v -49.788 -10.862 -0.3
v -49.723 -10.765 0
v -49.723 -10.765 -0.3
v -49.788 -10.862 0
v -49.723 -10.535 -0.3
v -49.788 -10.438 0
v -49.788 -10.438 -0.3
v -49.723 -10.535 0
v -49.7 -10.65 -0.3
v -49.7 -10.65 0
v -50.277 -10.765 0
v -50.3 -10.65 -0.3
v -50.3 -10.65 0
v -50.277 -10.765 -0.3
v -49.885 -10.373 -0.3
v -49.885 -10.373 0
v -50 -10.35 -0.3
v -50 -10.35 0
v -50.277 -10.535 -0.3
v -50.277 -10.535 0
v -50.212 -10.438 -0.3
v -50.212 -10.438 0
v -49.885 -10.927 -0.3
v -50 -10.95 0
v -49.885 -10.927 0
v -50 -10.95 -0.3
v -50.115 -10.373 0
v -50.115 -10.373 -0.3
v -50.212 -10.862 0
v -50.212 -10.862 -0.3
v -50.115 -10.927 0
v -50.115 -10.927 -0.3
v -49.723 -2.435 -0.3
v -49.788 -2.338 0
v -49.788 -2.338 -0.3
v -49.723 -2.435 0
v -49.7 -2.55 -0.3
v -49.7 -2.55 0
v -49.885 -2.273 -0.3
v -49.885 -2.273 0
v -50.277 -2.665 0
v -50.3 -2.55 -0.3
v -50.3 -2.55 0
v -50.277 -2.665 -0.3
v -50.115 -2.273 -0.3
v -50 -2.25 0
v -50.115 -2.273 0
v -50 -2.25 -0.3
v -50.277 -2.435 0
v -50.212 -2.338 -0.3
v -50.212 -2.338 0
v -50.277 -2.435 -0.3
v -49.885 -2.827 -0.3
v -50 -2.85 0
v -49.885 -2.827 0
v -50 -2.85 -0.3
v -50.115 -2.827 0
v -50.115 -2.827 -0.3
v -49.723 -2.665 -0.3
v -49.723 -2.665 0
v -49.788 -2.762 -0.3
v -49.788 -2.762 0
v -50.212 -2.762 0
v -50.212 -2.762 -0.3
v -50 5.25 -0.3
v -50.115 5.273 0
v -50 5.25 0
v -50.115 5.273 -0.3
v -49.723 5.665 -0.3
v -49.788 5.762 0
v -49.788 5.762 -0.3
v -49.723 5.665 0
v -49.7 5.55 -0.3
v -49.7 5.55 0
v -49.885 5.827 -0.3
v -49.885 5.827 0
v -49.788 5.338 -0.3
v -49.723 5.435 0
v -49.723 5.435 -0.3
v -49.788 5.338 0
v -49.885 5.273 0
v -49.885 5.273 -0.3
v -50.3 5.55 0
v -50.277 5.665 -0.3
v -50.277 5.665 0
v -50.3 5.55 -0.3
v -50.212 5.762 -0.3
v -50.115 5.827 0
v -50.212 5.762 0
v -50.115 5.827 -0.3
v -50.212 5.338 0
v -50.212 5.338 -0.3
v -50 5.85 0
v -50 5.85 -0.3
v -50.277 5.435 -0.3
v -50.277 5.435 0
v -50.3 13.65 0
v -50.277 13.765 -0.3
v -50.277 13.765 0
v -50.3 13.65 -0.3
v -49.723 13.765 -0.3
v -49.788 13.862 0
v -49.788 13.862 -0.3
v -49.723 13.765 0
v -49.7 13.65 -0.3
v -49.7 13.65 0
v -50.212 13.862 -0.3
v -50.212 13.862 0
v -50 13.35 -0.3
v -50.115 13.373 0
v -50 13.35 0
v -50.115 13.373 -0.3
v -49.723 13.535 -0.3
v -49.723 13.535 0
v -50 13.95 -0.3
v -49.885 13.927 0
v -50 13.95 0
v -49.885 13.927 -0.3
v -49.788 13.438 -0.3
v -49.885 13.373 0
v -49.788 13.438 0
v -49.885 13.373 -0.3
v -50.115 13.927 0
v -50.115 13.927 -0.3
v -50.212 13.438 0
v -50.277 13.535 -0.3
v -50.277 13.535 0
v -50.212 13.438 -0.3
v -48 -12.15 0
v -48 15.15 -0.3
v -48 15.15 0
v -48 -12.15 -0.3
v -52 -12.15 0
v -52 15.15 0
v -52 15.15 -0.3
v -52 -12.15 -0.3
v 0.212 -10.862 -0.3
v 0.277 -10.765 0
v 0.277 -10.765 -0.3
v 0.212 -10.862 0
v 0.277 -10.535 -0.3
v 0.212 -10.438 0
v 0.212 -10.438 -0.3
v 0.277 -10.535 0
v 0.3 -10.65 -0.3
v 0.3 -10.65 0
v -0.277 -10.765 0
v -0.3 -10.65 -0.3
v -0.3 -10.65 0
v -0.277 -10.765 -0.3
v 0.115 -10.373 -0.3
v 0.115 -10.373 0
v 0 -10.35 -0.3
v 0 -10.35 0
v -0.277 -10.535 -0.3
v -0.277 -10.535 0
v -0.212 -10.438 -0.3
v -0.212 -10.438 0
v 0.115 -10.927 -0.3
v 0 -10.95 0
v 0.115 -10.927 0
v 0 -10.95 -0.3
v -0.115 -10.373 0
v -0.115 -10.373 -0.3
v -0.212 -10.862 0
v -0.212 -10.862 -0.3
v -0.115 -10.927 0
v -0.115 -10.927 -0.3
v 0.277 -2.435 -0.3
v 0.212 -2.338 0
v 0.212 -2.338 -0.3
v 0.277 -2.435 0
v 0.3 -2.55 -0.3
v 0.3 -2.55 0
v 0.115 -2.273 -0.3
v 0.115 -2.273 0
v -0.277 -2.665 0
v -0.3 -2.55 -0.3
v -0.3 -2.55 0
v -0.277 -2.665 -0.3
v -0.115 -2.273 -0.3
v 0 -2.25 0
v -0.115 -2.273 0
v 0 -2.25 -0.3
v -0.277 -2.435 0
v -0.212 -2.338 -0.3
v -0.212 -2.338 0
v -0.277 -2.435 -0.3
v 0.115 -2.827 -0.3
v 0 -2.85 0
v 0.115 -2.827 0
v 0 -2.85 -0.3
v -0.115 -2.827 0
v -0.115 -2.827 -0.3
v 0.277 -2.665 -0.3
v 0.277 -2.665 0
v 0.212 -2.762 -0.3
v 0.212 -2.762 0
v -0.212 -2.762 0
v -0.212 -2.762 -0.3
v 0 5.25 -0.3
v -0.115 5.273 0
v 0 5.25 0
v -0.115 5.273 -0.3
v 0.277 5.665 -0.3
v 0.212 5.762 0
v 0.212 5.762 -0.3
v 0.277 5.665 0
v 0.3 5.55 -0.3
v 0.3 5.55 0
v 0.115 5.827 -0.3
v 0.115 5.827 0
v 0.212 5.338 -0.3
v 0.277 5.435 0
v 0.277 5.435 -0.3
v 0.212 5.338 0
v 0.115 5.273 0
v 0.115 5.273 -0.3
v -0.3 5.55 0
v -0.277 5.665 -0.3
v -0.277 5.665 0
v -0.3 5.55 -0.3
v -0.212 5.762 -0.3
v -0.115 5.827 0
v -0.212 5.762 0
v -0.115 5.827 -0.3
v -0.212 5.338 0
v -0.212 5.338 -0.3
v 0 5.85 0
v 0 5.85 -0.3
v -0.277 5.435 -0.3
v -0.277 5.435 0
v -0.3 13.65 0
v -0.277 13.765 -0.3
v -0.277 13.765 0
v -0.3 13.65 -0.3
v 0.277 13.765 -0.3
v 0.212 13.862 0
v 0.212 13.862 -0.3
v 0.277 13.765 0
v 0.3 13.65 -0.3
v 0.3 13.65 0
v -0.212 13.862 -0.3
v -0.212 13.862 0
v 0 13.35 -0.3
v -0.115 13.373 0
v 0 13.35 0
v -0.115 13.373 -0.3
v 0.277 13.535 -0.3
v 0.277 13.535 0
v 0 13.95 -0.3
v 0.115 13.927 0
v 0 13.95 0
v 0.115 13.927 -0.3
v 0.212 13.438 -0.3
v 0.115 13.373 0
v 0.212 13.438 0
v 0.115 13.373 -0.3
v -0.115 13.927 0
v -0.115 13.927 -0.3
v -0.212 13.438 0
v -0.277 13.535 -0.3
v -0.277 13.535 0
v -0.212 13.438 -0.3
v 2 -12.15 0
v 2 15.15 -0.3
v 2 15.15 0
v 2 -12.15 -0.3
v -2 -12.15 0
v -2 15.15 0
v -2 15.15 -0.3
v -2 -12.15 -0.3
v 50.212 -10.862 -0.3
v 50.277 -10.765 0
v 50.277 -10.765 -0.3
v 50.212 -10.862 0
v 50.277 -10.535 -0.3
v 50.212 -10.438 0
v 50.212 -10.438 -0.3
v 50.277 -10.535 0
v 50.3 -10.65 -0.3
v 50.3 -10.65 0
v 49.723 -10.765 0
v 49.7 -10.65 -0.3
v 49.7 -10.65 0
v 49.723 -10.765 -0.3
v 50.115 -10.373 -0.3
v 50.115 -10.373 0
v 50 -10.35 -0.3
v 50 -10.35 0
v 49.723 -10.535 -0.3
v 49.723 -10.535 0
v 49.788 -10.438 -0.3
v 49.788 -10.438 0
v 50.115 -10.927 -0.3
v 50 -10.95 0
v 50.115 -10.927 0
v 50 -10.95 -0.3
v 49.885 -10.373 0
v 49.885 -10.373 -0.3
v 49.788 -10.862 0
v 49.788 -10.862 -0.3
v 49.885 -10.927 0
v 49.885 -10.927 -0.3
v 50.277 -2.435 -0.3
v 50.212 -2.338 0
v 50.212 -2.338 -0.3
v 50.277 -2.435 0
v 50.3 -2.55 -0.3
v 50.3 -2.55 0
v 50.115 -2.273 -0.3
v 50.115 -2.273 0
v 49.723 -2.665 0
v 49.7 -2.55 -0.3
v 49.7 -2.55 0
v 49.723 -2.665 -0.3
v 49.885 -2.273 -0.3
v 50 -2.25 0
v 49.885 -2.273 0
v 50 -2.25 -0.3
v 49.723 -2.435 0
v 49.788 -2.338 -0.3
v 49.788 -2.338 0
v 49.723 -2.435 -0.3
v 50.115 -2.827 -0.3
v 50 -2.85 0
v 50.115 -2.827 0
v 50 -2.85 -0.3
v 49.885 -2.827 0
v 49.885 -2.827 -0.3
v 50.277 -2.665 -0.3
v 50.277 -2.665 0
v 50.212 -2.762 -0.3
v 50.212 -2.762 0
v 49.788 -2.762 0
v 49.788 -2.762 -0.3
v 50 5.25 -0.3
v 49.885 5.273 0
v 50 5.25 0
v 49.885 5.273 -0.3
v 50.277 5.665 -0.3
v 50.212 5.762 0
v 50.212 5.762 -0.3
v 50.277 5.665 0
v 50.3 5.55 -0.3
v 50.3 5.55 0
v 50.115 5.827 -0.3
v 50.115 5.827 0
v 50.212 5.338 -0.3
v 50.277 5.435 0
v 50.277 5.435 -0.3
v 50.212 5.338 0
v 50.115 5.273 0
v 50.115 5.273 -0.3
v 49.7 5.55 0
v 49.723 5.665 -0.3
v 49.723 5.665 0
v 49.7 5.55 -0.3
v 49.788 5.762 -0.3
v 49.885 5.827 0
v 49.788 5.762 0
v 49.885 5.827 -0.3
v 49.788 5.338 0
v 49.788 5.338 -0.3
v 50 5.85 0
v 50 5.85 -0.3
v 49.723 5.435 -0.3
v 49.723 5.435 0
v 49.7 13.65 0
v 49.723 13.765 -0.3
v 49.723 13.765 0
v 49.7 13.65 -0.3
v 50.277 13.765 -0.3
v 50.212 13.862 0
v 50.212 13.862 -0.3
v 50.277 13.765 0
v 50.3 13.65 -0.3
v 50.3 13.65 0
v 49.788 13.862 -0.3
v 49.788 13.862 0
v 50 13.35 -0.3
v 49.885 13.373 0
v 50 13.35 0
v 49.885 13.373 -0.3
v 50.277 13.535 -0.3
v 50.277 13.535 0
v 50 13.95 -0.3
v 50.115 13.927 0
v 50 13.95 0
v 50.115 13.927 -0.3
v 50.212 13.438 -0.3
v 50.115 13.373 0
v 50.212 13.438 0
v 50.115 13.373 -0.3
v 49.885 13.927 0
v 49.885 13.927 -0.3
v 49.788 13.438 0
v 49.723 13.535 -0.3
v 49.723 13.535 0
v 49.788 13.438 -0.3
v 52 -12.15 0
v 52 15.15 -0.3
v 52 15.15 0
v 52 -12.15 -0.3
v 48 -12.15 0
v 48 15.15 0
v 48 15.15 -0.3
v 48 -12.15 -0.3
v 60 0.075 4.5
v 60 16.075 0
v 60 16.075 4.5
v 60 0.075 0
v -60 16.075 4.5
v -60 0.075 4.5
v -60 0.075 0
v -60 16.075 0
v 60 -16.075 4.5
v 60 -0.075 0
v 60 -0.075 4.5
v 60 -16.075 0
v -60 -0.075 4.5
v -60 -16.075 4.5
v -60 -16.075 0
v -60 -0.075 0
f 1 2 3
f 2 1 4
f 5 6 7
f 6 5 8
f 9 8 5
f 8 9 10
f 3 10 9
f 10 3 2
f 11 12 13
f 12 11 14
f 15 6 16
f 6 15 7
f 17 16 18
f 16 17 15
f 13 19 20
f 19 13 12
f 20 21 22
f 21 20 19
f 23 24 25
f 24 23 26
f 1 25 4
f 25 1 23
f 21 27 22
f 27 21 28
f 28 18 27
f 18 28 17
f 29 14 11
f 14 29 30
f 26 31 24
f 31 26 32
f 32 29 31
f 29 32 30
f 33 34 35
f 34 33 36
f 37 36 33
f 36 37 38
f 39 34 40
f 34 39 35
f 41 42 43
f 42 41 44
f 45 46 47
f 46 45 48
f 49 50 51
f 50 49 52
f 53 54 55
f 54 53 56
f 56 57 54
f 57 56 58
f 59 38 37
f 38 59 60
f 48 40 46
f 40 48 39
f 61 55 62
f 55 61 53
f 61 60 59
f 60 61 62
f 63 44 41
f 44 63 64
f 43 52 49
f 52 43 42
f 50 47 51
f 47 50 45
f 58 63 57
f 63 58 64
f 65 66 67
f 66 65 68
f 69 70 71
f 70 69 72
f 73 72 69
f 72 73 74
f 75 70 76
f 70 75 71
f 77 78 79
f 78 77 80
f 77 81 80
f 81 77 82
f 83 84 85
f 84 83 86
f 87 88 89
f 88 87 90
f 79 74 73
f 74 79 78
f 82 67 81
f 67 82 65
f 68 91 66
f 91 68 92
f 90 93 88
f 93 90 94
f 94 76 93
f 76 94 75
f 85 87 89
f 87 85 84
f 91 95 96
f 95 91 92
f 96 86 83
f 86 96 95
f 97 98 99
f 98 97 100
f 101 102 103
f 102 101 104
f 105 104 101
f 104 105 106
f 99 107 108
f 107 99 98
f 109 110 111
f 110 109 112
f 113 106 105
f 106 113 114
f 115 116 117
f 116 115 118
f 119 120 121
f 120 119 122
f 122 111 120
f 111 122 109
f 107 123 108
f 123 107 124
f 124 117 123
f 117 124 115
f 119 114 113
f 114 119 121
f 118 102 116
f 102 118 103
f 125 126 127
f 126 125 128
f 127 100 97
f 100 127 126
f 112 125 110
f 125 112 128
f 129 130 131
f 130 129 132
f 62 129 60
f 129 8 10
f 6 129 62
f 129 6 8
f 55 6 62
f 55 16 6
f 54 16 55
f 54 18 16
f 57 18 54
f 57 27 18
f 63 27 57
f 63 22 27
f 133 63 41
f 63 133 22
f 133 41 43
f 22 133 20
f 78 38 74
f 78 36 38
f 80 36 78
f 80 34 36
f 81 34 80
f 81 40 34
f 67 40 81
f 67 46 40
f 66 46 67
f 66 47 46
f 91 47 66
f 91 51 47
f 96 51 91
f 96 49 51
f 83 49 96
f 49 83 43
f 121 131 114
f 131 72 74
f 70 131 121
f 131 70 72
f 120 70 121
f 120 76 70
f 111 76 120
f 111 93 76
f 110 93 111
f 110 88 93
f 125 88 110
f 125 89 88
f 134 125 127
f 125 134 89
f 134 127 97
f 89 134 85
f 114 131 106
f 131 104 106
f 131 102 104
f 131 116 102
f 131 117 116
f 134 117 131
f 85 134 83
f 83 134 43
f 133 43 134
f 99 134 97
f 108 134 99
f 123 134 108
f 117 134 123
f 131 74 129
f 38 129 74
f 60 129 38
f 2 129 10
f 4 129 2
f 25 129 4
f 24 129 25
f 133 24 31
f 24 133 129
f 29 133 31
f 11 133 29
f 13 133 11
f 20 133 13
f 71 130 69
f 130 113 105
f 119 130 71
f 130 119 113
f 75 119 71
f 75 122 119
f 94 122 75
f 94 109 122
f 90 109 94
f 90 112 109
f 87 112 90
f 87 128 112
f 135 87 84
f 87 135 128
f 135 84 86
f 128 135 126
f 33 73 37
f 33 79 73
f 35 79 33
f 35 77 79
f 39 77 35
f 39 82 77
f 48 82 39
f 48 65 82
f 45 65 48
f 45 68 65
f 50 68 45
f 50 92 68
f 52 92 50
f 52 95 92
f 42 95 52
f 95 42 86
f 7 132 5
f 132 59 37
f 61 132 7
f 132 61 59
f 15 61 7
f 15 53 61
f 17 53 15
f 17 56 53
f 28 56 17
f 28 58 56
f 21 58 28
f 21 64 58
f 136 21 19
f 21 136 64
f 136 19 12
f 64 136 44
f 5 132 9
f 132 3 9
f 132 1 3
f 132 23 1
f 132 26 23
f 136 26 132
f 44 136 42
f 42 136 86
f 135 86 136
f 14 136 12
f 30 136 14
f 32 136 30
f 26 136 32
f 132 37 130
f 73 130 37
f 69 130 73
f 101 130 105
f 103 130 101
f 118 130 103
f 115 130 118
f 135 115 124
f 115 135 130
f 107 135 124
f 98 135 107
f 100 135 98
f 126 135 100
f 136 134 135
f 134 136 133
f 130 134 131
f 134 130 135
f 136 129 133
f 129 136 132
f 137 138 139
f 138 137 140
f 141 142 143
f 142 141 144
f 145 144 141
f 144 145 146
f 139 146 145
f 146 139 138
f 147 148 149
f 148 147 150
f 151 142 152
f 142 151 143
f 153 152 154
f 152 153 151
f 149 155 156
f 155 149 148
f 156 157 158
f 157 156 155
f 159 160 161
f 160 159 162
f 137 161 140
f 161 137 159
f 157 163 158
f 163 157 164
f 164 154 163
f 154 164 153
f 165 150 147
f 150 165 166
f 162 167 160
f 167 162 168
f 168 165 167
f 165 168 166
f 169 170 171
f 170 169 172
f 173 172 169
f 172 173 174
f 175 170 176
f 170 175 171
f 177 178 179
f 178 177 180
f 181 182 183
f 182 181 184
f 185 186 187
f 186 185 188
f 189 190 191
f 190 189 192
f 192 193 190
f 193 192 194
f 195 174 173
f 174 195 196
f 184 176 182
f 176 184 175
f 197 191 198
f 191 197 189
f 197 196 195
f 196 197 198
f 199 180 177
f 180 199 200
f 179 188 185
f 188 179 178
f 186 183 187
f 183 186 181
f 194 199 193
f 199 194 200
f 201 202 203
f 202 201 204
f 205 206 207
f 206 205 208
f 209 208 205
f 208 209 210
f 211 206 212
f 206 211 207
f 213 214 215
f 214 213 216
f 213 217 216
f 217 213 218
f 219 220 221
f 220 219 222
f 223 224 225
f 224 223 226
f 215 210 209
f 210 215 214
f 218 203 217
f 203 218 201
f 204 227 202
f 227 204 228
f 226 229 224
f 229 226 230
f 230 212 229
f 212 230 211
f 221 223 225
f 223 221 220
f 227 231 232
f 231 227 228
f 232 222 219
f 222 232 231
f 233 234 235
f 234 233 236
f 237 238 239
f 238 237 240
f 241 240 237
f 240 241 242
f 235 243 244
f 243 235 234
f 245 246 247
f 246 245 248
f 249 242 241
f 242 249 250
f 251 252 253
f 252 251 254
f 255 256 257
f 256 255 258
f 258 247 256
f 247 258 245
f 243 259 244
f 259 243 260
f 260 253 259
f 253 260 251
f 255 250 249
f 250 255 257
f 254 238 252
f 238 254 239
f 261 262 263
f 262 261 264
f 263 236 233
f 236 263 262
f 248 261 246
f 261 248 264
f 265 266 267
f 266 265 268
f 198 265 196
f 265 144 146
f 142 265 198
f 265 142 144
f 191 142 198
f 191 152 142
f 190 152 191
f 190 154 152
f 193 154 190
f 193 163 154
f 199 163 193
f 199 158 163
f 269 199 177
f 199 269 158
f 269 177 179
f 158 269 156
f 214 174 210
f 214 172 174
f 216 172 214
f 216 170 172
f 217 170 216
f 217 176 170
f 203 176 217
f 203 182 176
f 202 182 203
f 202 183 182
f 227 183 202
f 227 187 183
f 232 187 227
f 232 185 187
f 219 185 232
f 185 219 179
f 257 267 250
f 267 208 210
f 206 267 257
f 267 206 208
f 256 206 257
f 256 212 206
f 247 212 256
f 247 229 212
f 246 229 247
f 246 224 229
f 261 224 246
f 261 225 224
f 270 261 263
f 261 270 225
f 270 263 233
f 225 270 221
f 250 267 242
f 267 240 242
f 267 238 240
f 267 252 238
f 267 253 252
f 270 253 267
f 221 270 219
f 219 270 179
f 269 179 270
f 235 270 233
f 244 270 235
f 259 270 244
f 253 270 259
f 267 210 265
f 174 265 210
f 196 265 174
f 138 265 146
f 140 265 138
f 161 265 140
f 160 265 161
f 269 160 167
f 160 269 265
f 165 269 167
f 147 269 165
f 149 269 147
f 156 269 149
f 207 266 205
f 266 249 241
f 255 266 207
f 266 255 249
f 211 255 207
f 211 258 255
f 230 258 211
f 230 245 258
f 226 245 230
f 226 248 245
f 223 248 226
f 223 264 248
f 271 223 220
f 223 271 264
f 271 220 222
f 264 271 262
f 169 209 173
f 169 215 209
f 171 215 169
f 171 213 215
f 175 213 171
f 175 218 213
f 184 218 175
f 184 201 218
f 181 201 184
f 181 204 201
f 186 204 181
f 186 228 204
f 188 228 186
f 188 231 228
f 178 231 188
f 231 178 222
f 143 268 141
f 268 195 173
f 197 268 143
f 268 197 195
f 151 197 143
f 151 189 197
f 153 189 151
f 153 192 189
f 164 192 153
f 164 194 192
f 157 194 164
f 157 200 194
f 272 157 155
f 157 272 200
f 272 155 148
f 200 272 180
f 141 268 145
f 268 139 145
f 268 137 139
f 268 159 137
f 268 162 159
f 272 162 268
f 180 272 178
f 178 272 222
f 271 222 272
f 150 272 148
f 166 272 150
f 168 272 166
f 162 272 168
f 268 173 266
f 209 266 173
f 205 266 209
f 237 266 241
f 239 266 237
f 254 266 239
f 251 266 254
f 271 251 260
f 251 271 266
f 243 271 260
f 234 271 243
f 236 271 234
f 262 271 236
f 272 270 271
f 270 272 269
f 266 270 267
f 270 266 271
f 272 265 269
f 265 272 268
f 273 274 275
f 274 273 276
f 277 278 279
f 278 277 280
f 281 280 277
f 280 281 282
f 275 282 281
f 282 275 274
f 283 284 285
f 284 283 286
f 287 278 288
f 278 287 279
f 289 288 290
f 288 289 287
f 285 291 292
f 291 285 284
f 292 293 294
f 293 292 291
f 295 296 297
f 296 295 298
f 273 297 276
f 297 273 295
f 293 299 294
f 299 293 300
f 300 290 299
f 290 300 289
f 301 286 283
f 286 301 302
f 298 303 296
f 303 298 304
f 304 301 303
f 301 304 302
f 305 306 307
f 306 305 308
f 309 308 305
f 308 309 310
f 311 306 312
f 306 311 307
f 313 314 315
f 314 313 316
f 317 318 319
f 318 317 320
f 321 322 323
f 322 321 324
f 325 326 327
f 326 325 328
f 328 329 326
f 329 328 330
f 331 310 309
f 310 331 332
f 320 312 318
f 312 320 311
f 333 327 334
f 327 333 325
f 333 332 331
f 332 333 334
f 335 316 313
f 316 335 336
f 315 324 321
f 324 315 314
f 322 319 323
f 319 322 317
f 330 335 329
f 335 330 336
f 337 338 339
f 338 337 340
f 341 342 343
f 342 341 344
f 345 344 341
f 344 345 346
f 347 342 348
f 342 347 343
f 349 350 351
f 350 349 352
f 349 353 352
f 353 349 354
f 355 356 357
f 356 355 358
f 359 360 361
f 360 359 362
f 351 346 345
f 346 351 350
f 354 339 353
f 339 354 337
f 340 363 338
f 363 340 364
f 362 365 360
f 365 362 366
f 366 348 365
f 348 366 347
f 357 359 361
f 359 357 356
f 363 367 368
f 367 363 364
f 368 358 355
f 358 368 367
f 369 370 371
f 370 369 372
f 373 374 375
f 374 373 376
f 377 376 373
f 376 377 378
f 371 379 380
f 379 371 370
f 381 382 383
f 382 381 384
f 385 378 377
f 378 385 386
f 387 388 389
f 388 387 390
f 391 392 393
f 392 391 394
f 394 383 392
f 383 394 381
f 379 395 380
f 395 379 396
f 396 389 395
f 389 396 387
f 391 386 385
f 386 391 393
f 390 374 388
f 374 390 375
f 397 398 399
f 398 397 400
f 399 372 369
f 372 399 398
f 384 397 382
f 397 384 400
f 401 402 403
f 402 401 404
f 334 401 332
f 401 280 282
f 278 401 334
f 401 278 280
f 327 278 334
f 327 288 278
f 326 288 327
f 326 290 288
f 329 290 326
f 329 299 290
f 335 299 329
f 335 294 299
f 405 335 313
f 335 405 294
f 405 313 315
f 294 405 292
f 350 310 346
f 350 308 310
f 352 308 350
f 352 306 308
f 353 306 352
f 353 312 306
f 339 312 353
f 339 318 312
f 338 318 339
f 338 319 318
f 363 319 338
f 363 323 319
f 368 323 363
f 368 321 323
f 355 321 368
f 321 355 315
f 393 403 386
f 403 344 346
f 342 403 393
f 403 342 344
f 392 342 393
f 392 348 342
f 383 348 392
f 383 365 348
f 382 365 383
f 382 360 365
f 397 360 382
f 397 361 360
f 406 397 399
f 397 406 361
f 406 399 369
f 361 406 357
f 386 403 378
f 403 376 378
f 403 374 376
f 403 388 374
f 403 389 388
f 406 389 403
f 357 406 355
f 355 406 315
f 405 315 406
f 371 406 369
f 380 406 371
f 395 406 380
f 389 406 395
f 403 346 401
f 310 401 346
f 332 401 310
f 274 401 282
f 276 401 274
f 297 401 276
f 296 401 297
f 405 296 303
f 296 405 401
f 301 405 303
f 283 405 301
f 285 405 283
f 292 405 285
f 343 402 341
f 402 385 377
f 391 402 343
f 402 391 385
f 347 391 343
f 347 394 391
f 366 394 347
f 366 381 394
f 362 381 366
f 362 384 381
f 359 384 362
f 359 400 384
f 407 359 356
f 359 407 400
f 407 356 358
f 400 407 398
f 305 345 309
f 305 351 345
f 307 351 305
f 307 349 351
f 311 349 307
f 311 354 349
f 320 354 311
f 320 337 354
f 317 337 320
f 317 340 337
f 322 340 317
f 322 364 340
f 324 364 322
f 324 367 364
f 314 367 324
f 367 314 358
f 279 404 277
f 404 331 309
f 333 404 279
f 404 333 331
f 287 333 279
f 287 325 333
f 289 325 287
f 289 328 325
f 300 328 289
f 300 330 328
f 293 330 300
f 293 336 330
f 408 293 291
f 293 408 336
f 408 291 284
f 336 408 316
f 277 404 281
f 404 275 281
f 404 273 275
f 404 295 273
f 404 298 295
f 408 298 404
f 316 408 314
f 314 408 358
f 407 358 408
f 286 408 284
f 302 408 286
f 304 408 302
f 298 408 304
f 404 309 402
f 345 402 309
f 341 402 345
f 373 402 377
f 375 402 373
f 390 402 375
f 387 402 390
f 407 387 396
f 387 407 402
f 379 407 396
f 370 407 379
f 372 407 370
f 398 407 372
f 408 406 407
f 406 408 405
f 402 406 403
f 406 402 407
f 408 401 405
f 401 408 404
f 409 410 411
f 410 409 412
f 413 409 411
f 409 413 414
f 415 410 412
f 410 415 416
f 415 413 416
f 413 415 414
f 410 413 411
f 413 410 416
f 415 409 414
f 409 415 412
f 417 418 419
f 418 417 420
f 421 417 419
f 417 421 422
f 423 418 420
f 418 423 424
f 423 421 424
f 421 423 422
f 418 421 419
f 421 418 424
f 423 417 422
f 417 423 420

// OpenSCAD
// file: hdim.scad
module hdim(x1 = 10, x2 = 20, y = 10, dimline_lenght = 9.0) 
{
    dimline_overlap = 0.5;
    dimline_width = 0.3;
    text_size = 2;
    tmp = 2*dimline_overlap+text_size/2;
    text_pos = dimline_lenght>0 ? tmp : -tmp; 
    dimline_abs = dimline_lenght>0 ? dimline_lenght : -dimline_lenght;
    
    // rotate([0,90,rotation]) 
    color([0,0,0])
    // translate([0,0,hex_length*0.5]) 
    {
        translate([x1,y-dimline_lenght/2,0]) 
            square([dimline_width, 
                dimline_abs + 2*dimline_overlap], 
                center=true, $fs=0.01);
                
        translate([x2,y-dimline_lenght/2,0]) 
            square([dimline_width, 
                dimline_abs + 2*dimline_overlap], 
                center=true, $fs=0.01);

        translate([(x1+x2)/2,y-dimline_lenght,0]) 
            square([x2-x1, 
                dimline_width], 
                center=true, $fs=0.01);
        
        translate([(x1+x2)/2,y-dimline_lenght-text_pos,0]) 
            text(str(x2-x1), size = text_size, 
                halign = "center",valign = "center");
    }
}

hdim();
// main file
use <hdim.scad> 

module twinwood(wood_l = 120, wood_w = 16, wood_t = 4.5, gap = 0.3, n_braces = 3, explode=false)
{
    wood_y = wood_w/2+gap/4;
    translate([0, wood_y, wood_t/2])
        tw_onewood(wood_l, wood_w, wood_t, gap, explode);

    translate([0, -wood_y, wood_t/2])
        tw_onewood(wood_l, wood_w, wood_t, gap, explode);

    first_brace = 10;
    brace_step = (wood_l-2*first_brace) / (n_braces-1);
    brace_z = explode ? -7 : 0;
    
    for (i=[0:n_braces-1])
    {
        brace_x = -wood_l/2 + first_brace + i * brace_step;
        
        translate([brace_x, 0, brace_z]) 
        tw_ironbrace(2*wood_w+gap);
    }
}        

module tw_onewood(wood_l, wood_w, wood_t, gap, explode)
{
    color([0.75,0.48,0.19, 1.0])
    translate([0,0,0])
    cube([wood_l, wood_w, wood_t], center=true);
}   

module tw_ironbrace(shelf_depth)
{
    brace_w = 4;
    brace_t = 0.3;
    brace_d1 = 4;
    brace_d2 = 1;
    n_screw_holes = 4;
    brace_l = shelf_depth - brace_d1 - brace_d2;
    screw_range = brace_l - 3;
    screw_step = screw_range/(n_screw_holes-1);
    first_screw = -screw_range/2;
    screw_hole_diam = 0.6;

    translate([0,(brace_d1-brace_d2)/2,-brace_t/2]) difference()
    {
        color([0.23,0.12,0.10, 1.0])
        cube([brace_w, brace_l, brace_t], center=true);
        
        for (x = [0: n_screw_holes-1]) {
            translate([0,x * screw_step + first_screw, 0])
            cylinder(h=brace_t+0.5,r=screw_hole_diam/2,center = true, $fn = 16);
        }
    }
}

twinwood();
